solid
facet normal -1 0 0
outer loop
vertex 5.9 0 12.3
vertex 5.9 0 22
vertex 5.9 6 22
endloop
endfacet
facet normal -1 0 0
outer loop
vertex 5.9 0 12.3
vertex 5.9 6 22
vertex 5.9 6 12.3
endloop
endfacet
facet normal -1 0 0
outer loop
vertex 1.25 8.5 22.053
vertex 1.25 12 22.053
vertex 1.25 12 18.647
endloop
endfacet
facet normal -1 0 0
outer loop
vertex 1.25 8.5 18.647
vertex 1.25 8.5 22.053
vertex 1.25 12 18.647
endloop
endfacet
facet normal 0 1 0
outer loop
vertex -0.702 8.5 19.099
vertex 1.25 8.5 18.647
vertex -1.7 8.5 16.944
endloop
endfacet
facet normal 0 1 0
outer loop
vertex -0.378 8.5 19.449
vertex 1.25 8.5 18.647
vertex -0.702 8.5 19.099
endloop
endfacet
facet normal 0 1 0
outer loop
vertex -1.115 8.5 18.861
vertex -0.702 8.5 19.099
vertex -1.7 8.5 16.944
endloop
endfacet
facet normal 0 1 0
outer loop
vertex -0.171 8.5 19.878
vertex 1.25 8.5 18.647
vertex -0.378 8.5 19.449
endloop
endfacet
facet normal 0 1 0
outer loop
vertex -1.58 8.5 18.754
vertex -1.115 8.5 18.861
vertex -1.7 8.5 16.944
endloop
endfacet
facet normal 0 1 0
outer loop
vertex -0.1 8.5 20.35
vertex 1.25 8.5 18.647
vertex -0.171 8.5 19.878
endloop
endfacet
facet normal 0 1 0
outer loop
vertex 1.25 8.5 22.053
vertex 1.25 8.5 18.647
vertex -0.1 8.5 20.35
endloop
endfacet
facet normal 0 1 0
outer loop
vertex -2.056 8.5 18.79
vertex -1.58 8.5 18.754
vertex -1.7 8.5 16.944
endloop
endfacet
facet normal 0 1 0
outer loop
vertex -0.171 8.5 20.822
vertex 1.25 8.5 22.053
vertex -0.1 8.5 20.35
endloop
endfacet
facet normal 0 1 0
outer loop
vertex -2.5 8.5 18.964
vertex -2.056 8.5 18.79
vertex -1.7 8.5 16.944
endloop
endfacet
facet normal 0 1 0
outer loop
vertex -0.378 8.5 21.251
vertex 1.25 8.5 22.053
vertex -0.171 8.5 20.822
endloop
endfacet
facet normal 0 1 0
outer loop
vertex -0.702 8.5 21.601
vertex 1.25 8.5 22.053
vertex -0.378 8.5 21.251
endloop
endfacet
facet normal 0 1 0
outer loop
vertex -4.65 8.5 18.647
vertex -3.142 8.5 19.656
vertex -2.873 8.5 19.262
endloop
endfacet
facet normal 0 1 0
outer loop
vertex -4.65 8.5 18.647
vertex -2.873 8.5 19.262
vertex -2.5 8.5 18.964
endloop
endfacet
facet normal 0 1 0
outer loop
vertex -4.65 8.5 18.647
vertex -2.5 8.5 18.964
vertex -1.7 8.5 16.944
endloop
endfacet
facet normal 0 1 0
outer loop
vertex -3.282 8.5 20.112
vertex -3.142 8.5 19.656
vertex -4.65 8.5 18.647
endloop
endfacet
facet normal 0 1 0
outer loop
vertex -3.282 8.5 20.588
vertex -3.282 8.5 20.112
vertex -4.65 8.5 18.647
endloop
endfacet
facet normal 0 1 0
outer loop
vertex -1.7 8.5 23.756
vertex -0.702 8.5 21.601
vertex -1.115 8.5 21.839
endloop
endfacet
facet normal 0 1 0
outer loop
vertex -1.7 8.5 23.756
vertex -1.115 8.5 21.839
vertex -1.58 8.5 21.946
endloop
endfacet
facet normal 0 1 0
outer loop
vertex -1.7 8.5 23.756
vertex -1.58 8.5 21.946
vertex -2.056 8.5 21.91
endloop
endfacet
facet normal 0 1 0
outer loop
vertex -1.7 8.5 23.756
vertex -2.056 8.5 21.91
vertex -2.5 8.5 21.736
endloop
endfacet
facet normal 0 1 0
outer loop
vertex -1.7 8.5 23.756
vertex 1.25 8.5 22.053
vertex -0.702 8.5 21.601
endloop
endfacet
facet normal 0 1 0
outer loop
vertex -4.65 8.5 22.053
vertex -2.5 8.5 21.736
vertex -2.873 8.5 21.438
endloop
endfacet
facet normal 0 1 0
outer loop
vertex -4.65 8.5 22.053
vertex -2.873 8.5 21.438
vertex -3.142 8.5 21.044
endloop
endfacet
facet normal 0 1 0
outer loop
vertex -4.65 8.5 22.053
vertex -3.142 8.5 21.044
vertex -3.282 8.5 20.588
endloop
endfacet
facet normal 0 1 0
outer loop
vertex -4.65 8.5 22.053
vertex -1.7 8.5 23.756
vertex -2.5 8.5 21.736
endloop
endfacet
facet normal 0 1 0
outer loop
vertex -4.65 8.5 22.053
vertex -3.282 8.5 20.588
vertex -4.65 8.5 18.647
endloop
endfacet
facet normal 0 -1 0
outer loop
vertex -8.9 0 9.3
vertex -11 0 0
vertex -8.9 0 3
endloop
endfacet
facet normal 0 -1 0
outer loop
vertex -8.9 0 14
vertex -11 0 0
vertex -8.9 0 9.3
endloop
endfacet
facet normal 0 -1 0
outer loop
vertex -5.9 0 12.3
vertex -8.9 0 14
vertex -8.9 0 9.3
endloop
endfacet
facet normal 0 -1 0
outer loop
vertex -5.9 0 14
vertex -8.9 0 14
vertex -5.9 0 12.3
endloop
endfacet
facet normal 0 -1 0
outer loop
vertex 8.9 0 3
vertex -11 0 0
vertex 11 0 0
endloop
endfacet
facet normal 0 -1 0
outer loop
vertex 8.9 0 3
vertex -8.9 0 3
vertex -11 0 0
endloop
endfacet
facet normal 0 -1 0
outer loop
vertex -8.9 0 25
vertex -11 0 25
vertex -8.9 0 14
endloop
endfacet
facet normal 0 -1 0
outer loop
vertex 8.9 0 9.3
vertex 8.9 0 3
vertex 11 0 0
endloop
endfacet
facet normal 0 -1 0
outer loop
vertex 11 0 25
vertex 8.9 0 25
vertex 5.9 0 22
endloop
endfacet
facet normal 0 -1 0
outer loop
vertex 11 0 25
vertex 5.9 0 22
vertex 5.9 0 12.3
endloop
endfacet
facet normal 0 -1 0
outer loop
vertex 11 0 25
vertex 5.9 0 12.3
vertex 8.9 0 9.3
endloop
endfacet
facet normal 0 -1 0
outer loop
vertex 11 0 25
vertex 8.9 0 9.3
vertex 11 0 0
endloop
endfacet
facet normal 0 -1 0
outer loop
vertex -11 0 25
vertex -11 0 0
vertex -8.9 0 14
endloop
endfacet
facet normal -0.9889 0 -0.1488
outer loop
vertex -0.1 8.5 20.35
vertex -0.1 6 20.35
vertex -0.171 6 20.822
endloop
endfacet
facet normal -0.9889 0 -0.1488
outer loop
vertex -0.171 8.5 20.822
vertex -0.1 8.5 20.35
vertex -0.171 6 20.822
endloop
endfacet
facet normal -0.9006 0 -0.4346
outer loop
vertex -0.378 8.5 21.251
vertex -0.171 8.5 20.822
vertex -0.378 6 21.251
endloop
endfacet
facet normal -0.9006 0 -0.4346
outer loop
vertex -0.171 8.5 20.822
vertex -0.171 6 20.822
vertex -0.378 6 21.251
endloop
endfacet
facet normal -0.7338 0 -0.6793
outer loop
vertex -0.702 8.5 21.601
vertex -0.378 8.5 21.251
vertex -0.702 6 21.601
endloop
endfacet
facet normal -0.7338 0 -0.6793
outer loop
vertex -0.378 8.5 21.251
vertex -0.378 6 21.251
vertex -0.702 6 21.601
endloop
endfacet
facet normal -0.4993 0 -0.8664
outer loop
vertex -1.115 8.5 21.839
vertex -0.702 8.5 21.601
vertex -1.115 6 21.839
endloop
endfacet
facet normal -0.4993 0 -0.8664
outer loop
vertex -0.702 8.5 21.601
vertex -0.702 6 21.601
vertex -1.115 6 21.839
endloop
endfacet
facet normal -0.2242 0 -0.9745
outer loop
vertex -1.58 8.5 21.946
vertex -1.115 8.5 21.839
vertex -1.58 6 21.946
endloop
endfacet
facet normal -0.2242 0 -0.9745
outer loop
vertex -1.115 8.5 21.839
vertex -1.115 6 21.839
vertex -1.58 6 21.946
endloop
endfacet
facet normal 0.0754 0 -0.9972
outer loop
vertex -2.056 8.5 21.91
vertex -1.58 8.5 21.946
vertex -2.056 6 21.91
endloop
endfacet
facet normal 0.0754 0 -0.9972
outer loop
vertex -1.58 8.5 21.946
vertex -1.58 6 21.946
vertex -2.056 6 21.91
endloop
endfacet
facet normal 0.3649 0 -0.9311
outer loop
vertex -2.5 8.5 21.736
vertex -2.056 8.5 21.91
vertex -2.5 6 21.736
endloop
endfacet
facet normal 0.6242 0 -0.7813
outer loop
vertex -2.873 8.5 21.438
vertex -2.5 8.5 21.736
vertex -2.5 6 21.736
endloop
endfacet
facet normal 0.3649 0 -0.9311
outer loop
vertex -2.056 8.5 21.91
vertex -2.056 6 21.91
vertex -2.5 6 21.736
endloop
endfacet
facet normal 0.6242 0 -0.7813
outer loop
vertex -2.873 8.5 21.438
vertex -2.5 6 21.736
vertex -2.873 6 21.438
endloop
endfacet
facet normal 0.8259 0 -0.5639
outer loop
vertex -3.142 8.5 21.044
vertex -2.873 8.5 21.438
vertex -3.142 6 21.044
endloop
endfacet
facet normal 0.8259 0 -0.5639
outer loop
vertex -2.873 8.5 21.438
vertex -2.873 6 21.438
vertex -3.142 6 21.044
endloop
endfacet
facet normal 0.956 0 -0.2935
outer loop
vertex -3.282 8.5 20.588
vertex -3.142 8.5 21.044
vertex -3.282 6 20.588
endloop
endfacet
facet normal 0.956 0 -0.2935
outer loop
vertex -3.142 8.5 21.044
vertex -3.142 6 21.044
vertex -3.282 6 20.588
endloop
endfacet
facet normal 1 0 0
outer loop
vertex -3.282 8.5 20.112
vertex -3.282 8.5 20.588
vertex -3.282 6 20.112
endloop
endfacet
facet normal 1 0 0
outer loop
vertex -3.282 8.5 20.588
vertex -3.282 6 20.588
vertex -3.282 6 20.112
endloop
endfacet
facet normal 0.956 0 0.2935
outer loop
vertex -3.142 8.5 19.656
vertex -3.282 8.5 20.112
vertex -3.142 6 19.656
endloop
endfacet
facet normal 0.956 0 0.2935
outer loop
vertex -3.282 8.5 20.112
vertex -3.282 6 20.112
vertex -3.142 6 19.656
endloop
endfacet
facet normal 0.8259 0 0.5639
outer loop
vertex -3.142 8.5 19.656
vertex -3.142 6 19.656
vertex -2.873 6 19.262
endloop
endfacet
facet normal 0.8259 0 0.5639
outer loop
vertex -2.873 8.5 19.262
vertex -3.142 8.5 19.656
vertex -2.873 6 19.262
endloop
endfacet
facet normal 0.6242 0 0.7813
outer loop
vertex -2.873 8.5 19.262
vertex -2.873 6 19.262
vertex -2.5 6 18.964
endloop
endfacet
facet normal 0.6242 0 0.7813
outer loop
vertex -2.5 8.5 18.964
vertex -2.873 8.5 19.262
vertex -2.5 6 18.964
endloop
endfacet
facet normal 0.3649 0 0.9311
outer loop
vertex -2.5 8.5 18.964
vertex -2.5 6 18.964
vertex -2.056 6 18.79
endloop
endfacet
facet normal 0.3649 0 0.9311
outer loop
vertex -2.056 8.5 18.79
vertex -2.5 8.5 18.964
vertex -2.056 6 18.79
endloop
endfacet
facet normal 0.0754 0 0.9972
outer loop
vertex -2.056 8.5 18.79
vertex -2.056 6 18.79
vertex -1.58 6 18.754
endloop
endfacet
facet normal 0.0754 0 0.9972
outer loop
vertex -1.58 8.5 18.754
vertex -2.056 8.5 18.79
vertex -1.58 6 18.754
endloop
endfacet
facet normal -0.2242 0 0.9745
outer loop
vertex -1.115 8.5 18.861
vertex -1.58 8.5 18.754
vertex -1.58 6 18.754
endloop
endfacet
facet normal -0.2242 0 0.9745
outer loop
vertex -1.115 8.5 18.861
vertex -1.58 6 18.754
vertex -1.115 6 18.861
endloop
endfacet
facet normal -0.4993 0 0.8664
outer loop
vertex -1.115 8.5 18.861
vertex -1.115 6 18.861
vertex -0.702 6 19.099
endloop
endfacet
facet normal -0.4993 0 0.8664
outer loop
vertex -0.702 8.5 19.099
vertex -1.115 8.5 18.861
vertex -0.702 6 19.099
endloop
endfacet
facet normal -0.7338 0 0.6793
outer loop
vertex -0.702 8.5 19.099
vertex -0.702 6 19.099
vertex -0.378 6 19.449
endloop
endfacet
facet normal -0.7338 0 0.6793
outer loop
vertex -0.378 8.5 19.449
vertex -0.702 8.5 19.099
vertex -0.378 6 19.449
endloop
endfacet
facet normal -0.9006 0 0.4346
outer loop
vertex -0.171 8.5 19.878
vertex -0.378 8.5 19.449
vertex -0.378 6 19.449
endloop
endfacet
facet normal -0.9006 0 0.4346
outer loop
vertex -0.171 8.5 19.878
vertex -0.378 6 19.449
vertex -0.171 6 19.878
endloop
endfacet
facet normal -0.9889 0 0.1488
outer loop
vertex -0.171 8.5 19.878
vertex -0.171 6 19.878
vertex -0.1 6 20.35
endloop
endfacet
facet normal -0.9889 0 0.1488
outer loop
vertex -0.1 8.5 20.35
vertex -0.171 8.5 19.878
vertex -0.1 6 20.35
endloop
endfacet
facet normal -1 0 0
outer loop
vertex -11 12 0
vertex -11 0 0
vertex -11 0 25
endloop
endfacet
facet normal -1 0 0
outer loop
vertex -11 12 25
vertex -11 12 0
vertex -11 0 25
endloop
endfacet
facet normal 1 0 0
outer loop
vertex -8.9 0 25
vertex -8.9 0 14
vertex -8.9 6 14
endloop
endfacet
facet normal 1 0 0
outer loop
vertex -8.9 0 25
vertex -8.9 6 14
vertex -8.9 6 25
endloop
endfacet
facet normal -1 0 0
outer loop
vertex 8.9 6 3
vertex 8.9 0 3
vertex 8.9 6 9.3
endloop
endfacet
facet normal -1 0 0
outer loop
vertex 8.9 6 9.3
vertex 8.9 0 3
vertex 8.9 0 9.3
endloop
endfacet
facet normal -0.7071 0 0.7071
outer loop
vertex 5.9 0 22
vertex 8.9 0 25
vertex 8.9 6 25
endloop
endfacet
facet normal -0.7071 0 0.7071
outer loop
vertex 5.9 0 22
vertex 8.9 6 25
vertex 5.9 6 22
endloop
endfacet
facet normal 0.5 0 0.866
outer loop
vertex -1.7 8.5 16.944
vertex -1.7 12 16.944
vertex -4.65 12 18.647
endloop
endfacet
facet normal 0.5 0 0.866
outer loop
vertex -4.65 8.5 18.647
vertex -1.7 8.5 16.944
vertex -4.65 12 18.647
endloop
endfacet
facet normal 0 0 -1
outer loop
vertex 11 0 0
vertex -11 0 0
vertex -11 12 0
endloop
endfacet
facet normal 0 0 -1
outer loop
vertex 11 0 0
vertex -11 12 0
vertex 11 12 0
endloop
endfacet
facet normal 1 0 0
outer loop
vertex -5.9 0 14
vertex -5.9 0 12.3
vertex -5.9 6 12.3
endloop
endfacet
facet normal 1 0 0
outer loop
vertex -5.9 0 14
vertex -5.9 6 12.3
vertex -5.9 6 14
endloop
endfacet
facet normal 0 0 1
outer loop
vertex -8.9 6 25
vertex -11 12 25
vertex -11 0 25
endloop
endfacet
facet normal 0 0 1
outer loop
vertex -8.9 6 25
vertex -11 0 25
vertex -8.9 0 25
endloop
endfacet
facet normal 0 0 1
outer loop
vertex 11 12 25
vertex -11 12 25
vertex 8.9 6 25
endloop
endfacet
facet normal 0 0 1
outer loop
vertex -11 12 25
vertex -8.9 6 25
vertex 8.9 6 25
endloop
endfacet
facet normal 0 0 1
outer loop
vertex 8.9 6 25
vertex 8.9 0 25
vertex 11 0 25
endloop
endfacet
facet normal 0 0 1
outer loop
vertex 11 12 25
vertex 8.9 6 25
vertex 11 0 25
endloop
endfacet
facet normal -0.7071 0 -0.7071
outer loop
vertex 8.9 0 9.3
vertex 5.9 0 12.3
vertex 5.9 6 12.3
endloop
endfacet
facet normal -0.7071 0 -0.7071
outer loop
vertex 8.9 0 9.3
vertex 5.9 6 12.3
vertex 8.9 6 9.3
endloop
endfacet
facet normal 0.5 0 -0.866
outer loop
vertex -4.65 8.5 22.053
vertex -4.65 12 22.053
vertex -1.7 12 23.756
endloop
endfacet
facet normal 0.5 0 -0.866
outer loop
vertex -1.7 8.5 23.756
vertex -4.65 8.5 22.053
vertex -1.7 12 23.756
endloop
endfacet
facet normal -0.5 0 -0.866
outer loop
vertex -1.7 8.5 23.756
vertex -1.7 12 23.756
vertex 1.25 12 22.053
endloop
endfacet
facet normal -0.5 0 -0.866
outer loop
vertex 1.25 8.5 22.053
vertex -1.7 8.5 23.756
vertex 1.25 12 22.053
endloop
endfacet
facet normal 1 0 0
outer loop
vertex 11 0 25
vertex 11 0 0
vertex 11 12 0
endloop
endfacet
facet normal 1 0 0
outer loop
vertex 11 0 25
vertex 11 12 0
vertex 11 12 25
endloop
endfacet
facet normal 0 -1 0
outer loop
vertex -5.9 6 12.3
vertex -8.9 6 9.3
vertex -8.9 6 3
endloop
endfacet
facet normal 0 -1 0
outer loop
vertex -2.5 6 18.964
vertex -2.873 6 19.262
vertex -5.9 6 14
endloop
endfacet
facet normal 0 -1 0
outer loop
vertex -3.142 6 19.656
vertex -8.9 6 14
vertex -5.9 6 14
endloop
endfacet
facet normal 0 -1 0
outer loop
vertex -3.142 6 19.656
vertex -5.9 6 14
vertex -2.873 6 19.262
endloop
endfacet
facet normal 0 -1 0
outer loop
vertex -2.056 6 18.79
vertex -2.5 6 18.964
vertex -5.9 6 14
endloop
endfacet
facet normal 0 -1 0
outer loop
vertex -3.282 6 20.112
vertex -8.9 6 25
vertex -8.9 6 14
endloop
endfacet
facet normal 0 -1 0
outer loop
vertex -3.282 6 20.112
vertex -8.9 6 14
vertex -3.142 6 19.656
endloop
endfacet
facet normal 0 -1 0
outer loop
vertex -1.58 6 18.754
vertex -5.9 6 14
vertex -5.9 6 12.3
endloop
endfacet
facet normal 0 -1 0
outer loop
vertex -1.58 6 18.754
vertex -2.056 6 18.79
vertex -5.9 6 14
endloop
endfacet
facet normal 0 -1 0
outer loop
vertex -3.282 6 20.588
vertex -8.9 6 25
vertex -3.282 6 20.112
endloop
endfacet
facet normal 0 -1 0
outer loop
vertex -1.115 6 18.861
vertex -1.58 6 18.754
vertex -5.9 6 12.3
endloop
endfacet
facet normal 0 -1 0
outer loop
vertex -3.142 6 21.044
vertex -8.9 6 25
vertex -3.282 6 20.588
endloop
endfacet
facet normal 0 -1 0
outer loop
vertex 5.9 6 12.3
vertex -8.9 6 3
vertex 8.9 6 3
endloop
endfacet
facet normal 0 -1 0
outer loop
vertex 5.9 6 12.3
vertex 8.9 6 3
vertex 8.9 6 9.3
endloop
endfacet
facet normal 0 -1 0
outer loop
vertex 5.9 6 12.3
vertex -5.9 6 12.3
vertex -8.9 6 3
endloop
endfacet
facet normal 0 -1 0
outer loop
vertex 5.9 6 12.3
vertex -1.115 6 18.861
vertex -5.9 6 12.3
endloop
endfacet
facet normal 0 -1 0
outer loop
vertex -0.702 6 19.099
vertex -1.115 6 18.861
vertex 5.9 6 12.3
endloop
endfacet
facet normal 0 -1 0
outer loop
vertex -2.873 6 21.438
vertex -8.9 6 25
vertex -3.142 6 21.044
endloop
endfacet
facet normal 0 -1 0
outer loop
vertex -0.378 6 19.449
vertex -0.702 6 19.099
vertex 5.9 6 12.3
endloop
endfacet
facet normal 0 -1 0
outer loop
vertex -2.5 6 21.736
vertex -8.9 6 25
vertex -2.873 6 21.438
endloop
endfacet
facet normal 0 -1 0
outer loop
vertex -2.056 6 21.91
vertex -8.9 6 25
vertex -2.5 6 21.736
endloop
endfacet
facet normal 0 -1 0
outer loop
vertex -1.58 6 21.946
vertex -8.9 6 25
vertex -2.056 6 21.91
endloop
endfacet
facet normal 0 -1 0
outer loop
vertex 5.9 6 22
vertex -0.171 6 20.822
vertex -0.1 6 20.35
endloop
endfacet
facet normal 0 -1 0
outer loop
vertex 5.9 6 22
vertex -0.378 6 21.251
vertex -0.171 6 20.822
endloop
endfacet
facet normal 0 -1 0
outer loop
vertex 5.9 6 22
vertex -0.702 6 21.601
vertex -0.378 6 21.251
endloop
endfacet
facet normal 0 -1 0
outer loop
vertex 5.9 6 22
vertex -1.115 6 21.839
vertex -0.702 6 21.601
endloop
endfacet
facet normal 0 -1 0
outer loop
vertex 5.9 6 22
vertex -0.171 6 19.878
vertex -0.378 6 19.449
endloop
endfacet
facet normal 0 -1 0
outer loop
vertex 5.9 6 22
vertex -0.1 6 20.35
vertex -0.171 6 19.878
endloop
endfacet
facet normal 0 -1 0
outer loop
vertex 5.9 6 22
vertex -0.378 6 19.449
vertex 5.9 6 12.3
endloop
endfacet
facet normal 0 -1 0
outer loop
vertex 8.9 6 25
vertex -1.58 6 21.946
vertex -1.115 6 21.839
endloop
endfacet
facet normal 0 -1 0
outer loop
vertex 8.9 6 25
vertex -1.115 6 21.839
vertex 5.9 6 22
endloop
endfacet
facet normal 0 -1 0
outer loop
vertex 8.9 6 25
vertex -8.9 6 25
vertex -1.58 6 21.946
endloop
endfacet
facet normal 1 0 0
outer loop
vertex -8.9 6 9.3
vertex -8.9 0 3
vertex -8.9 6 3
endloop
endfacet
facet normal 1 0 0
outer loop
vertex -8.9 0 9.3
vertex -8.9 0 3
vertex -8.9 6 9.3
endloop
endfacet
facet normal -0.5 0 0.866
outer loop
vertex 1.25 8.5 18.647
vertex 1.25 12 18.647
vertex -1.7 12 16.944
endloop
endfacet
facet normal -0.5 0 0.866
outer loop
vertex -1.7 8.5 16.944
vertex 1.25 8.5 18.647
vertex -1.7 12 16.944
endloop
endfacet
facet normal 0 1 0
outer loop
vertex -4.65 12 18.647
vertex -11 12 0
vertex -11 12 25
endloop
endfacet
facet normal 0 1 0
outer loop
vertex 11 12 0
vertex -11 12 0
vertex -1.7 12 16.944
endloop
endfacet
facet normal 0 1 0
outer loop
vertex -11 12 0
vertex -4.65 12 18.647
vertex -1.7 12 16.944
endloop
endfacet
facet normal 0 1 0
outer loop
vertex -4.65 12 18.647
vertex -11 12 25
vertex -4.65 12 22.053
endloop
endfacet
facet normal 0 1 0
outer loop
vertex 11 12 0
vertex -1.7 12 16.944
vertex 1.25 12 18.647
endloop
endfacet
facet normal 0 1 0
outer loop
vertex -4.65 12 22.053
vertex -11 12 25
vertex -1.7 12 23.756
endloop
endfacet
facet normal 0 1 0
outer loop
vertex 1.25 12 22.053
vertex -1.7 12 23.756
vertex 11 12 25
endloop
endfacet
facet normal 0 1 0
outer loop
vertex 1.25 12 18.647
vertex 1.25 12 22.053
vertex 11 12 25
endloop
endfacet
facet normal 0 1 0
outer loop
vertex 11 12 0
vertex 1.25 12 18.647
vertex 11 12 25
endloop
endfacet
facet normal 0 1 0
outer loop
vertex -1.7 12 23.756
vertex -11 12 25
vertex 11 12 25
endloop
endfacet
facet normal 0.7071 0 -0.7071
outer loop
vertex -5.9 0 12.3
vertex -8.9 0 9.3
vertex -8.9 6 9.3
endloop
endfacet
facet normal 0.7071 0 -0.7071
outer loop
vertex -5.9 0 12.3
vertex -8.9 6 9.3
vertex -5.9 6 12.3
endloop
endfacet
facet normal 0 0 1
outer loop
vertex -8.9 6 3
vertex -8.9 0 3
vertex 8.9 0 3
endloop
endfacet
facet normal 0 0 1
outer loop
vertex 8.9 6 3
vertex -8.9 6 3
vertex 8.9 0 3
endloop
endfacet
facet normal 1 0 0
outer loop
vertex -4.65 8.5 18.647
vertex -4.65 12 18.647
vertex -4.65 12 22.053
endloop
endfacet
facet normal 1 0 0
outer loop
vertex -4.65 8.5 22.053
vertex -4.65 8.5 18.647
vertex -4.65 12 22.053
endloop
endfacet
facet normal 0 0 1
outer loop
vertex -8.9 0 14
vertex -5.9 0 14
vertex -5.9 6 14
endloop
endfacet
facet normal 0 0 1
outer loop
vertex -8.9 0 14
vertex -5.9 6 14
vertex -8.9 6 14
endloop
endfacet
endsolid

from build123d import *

# Parameters (mm, degrees)
F0_W     = 22
F0_H     = 25
F1_DEPTH = 12
F2_W     = 17.8
F2_H     = 22
F3_DEPTH = 6
F5_DEPTH = 6
F6_R     = 1.6
F7_DEPTH = 6.001
F9_DEPTH = 3.5


with BuildPart() as f1:
    # F0 (on Front) → F1 (new body)
    with BuildSketch(Plane.XZ):
        with Locations((0, 12.5)):
            Rectangle(F0_W, F0_H)
    extrude(amount=-F1_DEPTH)

    # F2 (on face) → F3 (cut)
    with BuildSketch(Plane.XZ):
        with Locations((0, 14)):
            Rectangle(F2_W, F2_H)
    extrude(amount=-F3_DEPTH, mode=Mode.SUBTRACT)

    # F4 (on face) → F5 (join, through all)
    with BuildSketch(Plane.XZ):
        Polygon((-5.9, 14), (-8.9, 14), (-8.9, 9.3), (-5.9, 12.3), align=None)
        Polygon((8.9, 9.3), (8.9, 25), (5.9, 22), (5.9, 12.3), align=None)
    extrude(amount=-F5_DEPTH)

    # F6 (on face) → F7 (cut, through all)
    with BuildSketch(Plane.XZ.offset(-6)):
        with Locations((-1.7, 20.35)):
            Circle(F6_R)
    extrude(amount=-F7_DEPTH, mode=Mode.SUBTRACT)

    # F8 (on face) → F9 (cut)
    with BuildSketch(Plane(origin=(0, 12, 0), x_dir=(-1, 0, 0), z_dir=(0, 1, 0))):
        Polygon((4.65, 18.646817), (4.65, 22.053183), (1.7, 23.756367), (-1.25, 22.053183), (-1.25, 18.646817), (1.7, 16.943633), align=None)
    extrude(amount=-F9_DEPTH, mode=Mode.SUBTRACT)


solid = f1.part
